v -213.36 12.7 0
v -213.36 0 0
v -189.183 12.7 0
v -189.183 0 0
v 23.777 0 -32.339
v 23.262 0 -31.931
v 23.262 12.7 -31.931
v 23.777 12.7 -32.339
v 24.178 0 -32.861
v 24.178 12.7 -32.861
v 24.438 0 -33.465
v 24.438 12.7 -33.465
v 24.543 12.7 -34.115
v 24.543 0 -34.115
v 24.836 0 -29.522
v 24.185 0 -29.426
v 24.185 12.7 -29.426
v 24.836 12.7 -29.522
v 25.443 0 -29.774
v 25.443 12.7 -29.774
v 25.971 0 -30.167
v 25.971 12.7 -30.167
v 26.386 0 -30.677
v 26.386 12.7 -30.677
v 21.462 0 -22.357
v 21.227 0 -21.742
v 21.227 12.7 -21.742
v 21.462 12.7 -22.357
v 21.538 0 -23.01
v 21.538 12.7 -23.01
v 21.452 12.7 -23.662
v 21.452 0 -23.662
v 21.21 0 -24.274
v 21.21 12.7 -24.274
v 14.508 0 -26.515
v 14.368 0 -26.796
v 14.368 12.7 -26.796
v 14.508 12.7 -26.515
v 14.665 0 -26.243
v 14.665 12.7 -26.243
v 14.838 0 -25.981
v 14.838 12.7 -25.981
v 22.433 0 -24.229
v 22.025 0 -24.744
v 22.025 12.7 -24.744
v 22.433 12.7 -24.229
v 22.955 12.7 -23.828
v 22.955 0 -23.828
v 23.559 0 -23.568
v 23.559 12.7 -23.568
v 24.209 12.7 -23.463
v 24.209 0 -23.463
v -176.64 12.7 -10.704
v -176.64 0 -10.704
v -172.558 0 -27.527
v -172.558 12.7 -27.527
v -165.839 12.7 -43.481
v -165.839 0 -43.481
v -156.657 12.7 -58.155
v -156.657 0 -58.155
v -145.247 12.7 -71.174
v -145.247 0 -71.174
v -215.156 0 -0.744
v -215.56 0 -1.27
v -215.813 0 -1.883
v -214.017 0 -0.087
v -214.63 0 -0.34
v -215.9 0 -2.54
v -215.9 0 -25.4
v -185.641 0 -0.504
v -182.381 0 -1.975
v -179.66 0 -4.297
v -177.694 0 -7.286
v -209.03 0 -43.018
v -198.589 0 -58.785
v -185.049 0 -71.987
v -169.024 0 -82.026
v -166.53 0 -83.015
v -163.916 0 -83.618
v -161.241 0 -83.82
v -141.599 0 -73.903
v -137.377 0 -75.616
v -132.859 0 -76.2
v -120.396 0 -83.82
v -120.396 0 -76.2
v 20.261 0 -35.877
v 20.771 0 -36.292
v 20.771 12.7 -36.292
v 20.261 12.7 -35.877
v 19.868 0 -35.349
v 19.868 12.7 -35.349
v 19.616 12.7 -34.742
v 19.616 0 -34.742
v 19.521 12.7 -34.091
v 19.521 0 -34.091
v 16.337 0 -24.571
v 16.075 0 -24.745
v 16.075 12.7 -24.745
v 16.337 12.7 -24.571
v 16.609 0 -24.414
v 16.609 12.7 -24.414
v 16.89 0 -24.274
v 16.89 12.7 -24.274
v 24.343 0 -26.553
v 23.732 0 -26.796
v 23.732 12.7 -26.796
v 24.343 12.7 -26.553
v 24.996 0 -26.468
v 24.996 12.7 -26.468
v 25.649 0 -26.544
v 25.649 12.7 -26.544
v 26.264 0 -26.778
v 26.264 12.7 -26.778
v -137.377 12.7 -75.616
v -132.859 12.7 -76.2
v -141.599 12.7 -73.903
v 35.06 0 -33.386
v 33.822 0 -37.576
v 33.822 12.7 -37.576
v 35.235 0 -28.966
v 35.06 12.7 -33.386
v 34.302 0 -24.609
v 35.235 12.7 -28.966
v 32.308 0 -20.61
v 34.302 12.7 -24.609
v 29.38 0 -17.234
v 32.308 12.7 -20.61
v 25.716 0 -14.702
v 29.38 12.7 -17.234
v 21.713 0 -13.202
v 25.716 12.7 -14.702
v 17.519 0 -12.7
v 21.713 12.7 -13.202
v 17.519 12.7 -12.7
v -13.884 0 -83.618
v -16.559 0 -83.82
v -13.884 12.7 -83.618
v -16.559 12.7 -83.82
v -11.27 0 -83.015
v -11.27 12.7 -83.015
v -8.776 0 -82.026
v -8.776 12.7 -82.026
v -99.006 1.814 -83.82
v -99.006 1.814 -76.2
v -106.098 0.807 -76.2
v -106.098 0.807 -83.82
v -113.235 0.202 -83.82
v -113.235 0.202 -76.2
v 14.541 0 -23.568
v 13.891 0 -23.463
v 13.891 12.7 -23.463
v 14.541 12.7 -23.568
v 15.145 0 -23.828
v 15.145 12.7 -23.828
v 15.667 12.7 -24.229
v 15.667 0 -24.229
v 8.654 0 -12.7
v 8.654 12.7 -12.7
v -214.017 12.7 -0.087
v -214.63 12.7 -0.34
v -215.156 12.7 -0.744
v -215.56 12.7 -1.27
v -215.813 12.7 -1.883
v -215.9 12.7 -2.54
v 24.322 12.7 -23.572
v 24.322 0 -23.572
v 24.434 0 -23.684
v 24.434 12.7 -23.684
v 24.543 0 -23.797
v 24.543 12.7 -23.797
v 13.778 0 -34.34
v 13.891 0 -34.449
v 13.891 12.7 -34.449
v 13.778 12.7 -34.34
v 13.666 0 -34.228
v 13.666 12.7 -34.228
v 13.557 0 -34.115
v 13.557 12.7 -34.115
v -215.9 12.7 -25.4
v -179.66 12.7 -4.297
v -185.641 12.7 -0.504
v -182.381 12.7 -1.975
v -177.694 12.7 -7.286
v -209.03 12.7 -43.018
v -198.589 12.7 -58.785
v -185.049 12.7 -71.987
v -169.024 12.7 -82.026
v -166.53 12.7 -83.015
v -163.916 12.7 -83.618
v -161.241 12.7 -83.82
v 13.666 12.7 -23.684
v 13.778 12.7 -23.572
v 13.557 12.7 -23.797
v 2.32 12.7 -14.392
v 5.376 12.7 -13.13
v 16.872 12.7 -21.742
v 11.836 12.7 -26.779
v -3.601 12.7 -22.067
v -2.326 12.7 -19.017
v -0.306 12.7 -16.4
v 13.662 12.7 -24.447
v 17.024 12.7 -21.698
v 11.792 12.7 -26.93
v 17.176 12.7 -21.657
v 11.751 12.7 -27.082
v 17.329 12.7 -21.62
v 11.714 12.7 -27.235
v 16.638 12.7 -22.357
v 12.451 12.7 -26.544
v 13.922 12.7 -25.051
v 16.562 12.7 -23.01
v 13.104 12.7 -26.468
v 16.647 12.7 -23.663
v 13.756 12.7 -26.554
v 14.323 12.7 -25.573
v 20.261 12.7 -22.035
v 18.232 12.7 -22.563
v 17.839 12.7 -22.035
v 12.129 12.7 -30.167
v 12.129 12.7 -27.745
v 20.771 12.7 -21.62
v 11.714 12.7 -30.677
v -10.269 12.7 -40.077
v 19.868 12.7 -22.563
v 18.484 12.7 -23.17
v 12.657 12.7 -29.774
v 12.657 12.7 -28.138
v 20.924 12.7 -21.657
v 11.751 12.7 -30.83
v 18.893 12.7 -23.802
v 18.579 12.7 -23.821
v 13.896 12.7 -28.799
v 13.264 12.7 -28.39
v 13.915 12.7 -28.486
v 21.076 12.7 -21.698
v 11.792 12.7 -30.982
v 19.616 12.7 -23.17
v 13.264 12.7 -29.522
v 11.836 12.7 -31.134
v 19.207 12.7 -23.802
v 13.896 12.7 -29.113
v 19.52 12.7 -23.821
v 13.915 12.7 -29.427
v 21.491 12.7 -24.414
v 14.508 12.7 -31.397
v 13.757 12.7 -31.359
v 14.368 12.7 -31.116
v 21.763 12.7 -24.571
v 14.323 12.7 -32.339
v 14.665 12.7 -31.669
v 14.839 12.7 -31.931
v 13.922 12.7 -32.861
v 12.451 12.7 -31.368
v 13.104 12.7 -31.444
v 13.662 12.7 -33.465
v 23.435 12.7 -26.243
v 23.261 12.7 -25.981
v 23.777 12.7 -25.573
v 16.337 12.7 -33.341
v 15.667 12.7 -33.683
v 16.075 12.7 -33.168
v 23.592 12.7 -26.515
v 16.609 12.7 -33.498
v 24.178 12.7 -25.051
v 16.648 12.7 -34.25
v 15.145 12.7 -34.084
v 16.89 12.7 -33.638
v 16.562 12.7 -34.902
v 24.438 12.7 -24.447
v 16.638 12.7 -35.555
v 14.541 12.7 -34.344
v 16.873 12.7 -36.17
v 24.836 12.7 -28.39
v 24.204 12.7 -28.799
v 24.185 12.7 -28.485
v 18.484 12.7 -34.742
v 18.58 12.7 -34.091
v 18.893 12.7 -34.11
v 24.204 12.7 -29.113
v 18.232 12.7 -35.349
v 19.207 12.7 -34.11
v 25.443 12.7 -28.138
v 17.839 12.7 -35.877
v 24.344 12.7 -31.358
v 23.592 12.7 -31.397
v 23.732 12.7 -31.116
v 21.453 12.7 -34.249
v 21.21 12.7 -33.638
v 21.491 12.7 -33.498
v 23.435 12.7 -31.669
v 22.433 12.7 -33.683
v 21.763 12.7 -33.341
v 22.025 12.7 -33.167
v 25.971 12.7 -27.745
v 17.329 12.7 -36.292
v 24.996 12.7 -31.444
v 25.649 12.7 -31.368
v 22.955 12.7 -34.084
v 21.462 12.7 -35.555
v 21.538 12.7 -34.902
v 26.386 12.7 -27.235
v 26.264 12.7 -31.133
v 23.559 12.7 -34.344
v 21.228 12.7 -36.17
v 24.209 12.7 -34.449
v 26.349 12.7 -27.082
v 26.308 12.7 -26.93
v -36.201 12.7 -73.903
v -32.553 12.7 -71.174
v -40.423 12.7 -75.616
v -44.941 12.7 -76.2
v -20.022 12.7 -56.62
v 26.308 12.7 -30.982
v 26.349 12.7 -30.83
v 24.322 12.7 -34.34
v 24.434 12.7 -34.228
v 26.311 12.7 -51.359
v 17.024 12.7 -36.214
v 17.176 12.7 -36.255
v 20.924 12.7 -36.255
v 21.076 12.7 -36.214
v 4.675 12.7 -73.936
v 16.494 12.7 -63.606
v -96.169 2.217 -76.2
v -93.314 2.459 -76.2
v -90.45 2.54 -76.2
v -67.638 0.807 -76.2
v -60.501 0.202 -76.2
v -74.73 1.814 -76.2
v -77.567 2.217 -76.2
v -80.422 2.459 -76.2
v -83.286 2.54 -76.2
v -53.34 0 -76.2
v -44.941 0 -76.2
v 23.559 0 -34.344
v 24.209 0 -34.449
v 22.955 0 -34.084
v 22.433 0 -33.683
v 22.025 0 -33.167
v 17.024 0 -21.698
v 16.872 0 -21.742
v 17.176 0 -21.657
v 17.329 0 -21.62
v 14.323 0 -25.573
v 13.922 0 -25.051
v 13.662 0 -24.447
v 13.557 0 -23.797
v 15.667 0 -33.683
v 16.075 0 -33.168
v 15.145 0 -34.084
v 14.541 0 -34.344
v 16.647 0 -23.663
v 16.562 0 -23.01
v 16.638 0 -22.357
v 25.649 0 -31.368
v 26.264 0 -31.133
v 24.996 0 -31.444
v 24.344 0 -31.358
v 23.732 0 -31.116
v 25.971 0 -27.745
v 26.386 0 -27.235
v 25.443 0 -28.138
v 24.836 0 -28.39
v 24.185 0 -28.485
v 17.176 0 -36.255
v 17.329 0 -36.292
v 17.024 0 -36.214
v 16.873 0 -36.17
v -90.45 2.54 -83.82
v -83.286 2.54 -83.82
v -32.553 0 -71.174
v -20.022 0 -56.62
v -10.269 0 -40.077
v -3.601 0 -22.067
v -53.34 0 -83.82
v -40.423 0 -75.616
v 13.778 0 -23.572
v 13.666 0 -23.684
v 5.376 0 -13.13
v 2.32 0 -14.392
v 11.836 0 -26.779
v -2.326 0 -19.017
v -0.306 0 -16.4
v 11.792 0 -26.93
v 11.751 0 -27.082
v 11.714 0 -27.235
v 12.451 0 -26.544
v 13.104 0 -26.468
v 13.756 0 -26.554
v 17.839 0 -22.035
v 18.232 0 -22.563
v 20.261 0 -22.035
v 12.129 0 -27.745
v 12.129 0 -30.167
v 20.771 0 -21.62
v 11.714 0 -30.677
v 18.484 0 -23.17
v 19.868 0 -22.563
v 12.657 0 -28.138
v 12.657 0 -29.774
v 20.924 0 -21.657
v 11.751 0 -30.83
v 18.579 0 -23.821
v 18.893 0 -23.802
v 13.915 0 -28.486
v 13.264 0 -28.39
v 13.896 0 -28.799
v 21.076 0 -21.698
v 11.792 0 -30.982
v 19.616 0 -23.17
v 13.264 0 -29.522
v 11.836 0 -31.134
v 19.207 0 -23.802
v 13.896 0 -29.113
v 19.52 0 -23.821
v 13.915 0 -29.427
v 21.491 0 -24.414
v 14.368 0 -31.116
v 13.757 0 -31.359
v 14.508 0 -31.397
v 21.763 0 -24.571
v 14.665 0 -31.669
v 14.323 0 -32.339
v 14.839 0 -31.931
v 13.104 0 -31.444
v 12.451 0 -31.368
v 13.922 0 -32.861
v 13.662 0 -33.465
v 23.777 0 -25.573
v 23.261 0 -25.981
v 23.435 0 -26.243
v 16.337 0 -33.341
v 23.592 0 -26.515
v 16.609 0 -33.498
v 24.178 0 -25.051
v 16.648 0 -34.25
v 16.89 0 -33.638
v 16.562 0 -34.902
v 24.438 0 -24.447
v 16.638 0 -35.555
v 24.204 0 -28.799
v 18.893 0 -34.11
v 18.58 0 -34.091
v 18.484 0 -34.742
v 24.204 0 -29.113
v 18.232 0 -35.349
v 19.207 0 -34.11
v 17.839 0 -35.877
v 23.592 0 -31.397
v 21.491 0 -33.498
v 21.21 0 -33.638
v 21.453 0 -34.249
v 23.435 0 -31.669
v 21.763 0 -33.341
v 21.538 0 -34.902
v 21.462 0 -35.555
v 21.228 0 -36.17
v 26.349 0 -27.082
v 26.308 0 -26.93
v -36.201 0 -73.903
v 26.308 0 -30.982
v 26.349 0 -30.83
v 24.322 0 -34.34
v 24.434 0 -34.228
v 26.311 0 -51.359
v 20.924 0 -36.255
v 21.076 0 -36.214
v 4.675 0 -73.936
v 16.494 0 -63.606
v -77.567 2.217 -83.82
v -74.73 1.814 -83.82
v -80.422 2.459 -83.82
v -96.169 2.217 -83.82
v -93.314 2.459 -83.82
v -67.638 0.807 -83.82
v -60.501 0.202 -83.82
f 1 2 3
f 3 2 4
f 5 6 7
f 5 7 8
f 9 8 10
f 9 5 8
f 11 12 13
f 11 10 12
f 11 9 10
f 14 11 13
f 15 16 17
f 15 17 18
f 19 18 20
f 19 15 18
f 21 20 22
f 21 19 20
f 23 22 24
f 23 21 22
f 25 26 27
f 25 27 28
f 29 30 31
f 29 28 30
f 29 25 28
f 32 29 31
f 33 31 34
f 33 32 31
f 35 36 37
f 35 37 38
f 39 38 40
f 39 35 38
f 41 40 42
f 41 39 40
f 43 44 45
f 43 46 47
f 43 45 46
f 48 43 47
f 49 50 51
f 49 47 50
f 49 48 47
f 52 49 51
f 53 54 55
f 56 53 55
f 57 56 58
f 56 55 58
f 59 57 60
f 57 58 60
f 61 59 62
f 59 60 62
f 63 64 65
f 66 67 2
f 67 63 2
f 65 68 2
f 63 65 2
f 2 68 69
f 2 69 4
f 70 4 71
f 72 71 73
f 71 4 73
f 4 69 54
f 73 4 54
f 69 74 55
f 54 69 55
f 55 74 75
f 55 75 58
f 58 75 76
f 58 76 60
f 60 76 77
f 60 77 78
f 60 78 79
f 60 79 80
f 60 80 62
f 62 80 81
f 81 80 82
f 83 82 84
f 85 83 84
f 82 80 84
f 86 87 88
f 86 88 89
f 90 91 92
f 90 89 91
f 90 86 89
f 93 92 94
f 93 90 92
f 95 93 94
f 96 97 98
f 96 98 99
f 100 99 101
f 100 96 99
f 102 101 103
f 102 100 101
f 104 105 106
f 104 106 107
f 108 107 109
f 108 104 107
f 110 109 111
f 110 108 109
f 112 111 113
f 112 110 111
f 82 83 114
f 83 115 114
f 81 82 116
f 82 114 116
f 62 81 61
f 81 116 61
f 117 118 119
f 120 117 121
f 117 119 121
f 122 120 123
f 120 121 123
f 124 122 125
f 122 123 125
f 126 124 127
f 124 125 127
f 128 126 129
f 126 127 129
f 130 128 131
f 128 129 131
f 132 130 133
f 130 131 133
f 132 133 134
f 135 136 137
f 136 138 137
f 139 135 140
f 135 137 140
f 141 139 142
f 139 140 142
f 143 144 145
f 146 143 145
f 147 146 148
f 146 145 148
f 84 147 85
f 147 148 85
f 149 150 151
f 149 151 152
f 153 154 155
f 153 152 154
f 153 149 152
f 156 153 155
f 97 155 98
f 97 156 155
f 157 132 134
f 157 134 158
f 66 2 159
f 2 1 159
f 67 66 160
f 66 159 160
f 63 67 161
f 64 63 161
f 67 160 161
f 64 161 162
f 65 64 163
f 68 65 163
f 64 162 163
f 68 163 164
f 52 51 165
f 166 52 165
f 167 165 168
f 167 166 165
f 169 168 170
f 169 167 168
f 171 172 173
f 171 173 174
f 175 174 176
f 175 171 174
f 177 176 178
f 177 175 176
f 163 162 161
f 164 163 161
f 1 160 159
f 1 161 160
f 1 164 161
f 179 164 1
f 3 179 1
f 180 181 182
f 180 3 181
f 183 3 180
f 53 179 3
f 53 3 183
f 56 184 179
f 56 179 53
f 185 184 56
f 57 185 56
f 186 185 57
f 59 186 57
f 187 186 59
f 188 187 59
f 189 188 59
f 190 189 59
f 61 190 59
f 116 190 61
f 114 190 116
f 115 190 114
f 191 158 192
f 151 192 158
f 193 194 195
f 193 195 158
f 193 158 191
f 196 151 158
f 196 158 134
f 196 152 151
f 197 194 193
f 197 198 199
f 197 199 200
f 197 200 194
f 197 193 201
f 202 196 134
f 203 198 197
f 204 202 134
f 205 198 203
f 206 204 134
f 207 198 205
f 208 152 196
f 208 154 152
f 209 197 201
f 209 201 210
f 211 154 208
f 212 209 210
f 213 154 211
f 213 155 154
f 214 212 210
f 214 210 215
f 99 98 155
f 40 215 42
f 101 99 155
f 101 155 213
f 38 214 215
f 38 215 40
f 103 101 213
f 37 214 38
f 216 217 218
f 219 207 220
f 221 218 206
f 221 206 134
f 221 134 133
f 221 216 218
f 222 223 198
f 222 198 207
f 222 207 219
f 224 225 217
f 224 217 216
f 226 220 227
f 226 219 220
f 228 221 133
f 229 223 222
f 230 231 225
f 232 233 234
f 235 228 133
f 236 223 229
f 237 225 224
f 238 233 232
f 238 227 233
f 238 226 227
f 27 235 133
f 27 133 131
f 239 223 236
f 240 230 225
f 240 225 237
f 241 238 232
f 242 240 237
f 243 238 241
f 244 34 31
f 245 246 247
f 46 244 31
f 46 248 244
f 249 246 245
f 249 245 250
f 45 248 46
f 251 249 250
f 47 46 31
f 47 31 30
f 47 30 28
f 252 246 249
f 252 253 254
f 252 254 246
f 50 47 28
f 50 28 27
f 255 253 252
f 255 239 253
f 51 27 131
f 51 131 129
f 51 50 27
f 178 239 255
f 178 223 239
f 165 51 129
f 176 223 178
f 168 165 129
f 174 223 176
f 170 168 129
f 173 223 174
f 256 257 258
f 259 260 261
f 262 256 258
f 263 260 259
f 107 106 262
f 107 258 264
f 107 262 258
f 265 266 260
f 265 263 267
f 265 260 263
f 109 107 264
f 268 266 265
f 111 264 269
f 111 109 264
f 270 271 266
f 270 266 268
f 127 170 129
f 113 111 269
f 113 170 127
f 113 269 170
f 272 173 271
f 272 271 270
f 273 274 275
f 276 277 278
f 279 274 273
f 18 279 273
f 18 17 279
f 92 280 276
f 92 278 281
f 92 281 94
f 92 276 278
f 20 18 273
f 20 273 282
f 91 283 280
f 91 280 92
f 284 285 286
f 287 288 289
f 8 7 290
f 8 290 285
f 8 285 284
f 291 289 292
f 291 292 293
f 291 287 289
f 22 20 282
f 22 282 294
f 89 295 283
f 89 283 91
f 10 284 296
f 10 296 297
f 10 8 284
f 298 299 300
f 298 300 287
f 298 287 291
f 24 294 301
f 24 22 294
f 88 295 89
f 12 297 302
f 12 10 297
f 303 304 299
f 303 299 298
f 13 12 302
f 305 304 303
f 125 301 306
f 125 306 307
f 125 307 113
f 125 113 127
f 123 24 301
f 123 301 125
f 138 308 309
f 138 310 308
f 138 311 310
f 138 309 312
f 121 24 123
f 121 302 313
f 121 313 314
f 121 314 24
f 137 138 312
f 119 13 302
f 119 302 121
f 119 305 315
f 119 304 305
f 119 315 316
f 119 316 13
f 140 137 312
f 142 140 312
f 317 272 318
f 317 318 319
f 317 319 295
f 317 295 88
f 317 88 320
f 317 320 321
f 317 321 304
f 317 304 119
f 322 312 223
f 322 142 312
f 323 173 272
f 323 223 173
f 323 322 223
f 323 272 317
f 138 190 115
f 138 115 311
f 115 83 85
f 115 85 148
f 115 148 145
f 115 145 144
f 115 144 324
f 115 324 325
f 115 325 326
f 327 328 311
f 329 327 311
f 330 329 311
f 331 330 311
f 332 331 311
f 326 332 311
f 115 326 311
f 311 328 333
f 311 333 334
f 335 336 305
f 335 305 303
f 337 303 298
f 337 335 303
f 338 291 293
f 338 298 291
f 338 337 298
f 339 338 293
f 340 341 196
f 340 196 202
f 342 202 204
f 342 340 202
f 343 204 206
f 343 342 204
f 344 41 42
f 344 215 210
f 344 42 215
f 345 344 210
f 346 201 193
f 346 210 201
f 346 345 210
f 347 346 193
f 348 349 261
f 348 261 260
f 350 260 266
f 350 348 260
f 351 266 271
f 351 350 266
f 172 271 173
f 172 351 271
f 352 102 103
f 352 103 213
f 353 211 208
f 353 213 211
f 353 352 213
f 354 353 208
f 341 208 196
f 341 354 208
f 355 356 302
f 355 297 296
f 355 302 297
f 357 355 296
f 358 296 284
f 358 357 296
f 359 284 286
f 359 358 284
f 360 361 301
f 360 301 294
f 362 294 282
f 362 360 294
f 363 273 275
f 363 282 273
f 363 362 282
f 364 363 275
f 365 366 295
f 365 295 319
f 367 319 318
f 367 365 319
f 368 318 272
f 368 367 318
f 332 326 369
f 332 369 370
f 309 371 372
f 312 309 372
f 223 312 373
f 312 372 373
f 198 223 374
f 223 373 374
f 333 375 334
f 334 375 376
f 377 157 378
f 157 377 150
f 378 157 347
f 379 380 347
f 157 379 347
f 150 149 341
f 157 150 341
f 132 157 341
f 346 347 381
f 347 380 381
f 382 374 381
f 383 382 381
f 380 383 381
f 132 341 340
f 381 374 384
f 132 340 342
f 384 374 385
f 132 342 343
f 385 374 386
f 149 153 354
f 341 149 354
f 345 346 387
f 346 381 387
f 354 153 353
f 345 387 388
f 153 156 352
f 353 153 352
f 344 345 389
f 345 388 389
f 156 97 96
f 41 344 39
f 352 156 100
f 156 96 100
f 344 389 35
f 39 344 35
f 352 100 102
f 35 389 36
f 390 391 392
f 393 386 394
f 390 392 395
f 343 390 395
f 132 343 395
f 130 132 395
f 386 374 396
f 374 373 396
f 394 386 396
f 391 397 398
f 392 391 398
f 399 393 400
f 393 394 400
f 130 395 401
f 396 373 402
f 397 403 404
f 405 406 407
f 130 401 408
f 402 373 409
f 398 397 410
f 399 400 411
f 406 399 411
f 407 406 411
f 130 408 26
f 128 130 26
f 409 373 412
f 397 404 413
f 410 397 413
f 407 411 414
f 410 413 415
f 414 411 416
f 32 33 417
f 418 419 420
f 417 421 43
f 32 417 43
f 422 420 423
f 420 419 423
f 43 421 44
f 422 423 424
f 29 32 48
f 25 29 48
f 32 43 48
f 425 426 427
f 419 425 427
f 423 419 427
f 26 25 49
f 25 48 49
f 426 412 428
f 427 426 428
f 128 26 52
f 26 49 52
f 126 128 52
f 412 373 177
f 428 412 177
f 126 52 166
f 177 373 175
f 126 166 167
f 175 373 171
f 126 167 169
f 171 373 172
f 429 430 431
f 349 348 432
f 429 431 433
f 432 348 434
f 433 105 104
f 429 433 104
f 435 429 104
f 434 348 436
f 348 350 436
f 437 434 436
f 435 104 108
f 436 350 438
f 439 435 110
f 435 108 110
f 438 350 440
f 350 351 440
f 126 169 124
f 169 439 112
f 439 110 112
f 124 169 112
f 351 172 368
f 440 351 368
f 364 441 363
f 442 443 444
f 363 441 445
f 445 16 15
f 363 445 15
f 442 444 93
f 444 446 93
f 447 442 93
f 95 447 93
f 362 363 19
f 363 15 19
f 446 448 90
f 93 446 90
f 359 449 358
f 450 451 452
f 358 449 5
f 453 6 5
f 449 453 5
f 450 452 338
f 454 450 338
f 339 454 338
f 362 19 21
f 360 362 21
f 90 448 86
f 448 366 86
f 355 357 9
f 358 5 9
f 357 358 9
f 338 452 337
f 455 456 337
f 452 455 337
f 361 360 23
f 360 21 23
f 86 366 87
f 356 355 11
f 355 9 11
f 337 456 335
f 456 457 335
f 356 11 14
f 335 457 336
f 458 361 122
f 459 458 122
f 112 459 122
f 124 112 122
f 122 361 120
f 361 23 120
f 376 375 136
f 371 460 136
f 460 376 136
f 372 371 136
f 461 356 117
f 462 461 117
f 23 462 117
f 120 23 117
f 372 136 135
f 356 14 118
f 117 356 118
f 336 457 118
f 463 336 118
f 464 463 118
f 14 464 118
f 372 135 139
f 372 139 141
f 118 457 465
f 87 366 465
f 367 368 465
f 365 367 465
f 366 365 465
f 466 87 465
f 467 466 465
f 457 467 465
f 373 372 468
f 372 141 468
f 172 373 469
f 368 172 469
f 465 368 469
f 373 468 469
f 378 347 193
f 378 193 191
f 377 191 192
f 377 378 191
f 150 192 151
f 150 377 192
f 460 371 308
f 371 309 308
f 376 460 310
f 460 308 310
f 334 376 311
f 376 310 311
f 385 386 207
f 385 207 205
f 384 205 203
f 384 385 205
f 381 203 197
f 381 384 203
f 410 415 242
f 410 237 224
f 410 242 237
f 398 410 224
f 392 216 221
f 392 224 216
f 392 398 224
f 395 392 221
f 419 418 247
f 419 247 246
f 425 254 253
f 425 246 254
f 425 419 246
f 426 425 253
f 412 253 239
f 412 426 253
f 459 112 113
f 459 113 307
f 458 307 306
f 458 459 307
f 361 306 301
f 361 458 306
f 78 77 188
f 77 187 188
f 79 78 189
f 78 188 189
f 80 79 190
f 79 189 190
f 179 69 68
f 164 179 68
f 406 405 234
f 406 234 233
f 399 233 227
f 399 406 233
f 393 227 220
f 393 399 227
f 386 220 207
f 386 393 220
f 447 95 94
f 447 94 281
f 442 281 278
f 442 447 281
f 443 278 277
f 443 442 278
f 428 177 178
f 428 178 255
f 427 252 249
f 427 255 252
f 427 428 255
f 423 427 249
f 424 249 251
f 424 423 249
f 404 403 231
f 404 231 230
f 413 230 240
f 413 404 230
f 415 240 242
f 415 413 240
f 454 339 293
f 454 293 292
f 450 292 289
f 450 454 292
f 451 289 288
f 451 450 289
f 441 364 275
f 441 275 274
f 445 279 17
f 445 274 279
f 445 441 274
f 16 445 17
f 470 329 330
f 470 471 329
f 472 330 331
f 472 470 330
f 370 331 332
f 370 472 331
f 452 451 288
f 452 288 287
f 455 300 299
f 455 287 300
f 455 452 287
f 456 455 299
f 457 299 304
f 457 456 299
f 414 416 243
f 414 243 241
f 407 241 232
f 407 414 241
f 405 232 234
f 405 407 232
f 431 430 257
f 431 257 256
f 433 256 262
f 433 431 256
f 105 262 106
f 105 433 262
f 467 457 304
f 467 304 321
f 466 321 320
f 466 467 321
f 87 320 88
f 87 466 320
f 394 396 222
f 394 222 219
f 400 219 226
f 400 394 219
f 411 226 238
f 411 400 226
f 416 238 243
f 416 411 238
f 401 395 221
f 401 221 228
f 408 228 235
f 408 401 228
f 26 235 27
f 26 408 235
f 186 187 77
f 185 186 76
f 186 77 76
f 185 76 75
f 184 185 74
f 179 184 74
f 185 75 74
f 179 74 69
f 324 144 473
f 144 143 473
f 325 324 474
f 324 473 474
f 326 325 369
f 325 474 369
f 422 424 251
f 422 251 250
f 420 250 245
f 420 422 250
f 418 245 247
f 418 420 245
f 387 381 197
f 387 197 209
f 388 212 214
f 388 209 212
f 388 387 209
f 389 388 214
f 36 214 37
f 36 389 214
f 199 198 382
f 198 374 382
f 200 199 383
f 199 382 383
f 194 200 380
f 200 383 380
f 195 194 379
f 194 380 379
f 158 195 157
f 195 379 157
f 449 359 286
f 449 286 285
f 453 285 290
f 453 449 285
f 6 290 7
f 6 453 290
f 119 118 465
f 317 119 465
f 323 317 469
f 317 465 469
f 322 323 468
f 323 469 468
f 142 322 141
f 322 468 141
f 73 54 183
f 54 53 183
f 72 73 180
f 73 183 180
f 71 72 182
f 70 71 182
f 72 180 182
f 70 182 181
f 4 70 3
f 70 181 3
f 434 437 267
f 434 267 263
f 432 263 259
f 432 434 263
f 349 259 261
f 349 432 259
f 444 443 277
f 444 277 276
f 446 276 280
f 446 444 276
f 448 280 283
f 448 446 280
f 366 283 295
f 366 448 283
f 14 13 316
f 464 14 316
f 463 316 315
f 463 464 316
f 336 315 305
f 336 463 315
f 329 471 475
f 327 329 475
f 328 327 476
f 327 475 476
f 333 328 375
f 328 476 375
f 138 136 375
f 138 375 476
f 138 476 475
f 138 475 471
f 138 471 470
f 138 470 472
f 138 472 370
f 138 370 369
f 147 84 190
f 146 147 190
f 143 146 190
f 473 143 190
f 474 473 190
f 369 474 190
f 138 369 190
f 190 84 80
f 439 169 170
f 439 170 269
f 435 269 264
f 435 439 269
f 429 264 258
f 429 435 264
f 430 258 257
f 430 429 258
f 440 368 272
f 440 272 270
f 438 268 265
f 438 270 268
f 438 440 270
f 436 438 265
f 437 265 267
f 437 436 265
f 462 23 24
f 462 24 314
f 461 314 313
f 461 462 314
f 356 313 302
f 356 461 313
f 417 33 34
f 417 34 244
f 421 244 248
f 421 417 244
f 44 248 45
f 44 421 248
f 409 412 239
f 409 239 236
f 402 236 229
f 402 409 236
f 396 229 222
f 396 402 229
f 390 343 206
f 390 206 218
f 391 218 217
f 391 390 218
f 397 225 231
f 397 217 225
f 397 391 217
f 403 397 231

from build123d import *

# Parameters (mm, degrees)
BOSS_EXTRUDE1_DEPTH = 12.7
SKETCH3_R           = 2.286
CUT_EXTRUDE1_DEPTH  = 232.948038146
CAVITY1_START       = -1
CAVITY1_OUTLINE_R   = 2.286
CAVITY1_DEPTH       = 15
CUT_EXTRUDE2_DEPTH  = 232.948038146
FILLET1_R           = 12.7
FILLET2_R           = 2.54
FILLET3_R           = 20.32
FILLET4_R           = 17.78
SKETCH5_W           = 16.51
SKETCH5_H           = 5.08
CUT_EXTRUDE3_DEPTH  = 230.304470216
FILLET5_R           = 127
FILLET6_R           = 50.8


with BuildPart() as part:
    # Sketch1 → Boss-Extrude1 (new body)
    with BuildSketch(Plane(origin=(0, 0, 0), x_dir=(1, 0, 0), z_dir=(0, 1, 0))):
        with BuildLine():
            Line((0, 0), (38.1, 0))
            Line((38.1, 0), (38.1, 25.4))
            ThreePointArc((38.1, 25.4), (19.393233119, 60.430202712), (-12.7, 83.82))
            Line((-12.7, 83.82), (-165.1, 83.82))
            ThreePointArc((-165.1, 83.82), (-197.193233119, 60.430202712), (-215.9, 25.4))
            Line((-215.9, 25.4), (-215.9, 0))
            Line((-215.9, 0), (-177.8, 0))
            ThreePointArc((-177.8, 0), (-166.58502935, 42.017514675), (-139.7, 76.2))
            Line((-139.7, 76.2), (-38.1, 76.2))
            ThreePointArc((-38.1, 76.2), (-11.21497065, 42.017514675), (0, 0))
        make_face()
    extrude(amount=BOSS_EXTRUDE1_DEPTH)

    # Sketch3 → Cut-Extrude1 (cut, through all)
    with BuildSketch(Plane(origin=(0, 12.7, 0), x_dir=(1, 0, 0), z_dir=(0, 1, 0))):
        with Locations(Location((19.05, 28.956, 0), (0, 0, 270))):
            Circle(SKETCH3_R)
    extrude(amount=-CUT_EXTRUDE1_DEPTH, mode=Mode.SUBTRACT)

    # Cavity1: read off the stored shape, not the designer's step
    # Cavity1 outline → Cavity1 (cut)
    with BuildSketch(Plane(origin=(0, 0, 0), x_dir=(1, 0, 0), z_dir=(0, 1, 0)).offset(CAVITY1_START)):
        with BuildLine():
            ThreePointArc((13.557199982, 23.797473427), (13.721594677, 23.627834729), (13.891225968, 23.463432392))
            ThreePointArc((13.891225968, 23.463432392), (15.144839416, 23.828362371), (16.075009031, 24.744607454))
            ThreePointArc((16.075009031, 24.744607454), (16.471799412, 24.490657889), (16.890111616, 24.273983275))
            ThreePointArc((16.890111616, 24.273983275), (16.561647975, 23.010325013), (16.872358933, 21.742184932))
            ThreePointArc((16.872358933, 21.742184932), (17.099548264, 21.677470858), (17.32865444, 21.619909903))
            ThreePointArc((17.32865444, 21.619909903), (18.231850543, 22.56275526), (18.579278518, 23.821331586))
            ThreePointArc((18.579278518, 23.821331586), (19.049883851, 23.799800001), (19.520490153, 23.821310384))
            ThreePointArc((19.520490153, 23.821310384), (19.867861426, 22.562718407), (20.77101505, 21.61983236))
            ThreePointArc((20.77101505, 21.61983236), (21.000123819, 21.677382993), (21.227316065, 21.742086832))
            ThreePointArc((21.227316065, 21.742086832), (21.538084156, 23.010212914), (21.209677446, 24.273885972))
            ThreePointArc((21.209677446, 24.273885972), (21.627999411, 24.490541739), (22.024801233, 24.744473428))
            ThreePointArc((22.024801233, 24.744473428), (22.954929568, 23.828186439), (24.208526573, 23.463199982))
            ThreePointArc((24.208526573, 23.463199982), (24.378165271, 23.627594677), (24.542567608, 23.797225968))
            ThreePointArc((24.542567608, 23.797225968), (24.177637629, 25.050839416), (23.261392546, 25.981009031))
            ThreePointArc((23.261392546, 25.981009031), (23.515342111, 26.377799412), (23.732016725, 26.796111616))
            ThreePointArc((23.732016725, 26.796111616), (24.995674987, 26.467647975), (26.263815068, 26.778358933))
            ThreePointArc((26.263815068, 26.778358933), (26.328529142, 27.005548264), (26.386090097, 27.23465444))
            ThreePointArc((26.386090097, 27.23465444), (25.44324474, 28.137850543), (24.184668414, 28.485278518))
            ThreePointArc((24.184668414, 28.485278518), (24.206199999, 28.955883851), (24.184689616, 29.426490153))
            ThreePointArc((24.184689616, 29.426490153), (25.443281593, 29.773861426), (26.38616764, 30.67701505))
            ThreePointArc((26.38616764, 30.67701505), (26.328617007, 30.906123819), (26.263913168, 31.133316065))
            ThreePointArc((26.263913168, 31.133316065), (24.995787086, 31.444084156), (23.732114028, 31.115677446))
            ThreePointArc((23.732114028, 31.115677446), (23.515458261, 31.533999411), (23.261526572, 31.930801233))
            ThreePointArc((23.261526572, 31.930801233), (24.177813561, 32.860929568), (24.542800018, 34.114526573))
            ThreePointArc((24.542800018, 34.114526573), (24.378405323, 34.284165271), (24.208774032, 34.448567608))
            ThreePointArc((24.208774032, 34.448567608), (22.955160584, 34.083637629), (22.024990969, 33.167392546))
            ThreePointArc((22.024990969, 33.167392546), (21.628200588, 33.421342111), (21.209888384, 33.638016725))
            ThreePointArc((21.209888384, 33.638016725), (21.538352025, 34.901674987), (21.227641067, 36.169815068))
            ThreePointArc((21.227641067, 36.169815068), (21.000451736, 36.234529142), (20.77134556, 36.292090097))
            ThreePointArc((20.77134556, 36.292090097), (19.868149457, 35.34924474), (19.520721482, 34.090668414))
            ThreePointArc((19.520721482, 34.090668414), (19.050116149, 34.112199999), (18.579509847, 34.090689616))
            ThreePointArc((18.579509847, 34.090689616), (18.232138574, 35.349281593), (17.32898495, 36.29216764))
            ThreePointArc((17.32898495, 36.29216764), (17.099876181, 36.234617007), (16.872683935, 36.169913168))
            ThreePointArc((16.872683935, 36.169913168), (16.561915844, 34.901787086), (16.890322554, 33.638114028))
            ThreePointArc((16.890322554, 33.638114028), (16.472000589, 33.421458261), (16.075198767, 33.167526572))
            ThreePointArc((16.075198767, 33.167526572), (15.145070432, 34.083813561), (13.891473427, 34.448800018))
            ThreePointArc((13.891473427, 34.448800018), (13.721834729, 34.284405323), (13.557432392, 34.114774032))
            ThreePointArc((13.557432392, 34.114774032), (13.922362371, 32.861160584), (14.838607454, 31.930990969))
            ThreePointArc((14.838607454, 31.930990969), (14.584657889, 31.534200588), (14.367983275, 31.115888384))
            ThreePointArc((14.367983275, 31.115888384), (13.104325013, 31.444352025), (11.836184932, 31.133641067))
            ThreePointArc((11.836184932, 31.133641067), (11.771470858, 30.906451736), (11.713909903, 30.67734556))
            ThreePointArc((11.713909903, 30.67734556), (12.65675526, 29.774149457), (13.915331586, 29.426721482))
            ThreePointArc((13.915331586, 29.426721482), (13.893800001, 28.956116149), (13.915310384, 28.485509847))
            ThreePointArc((13.915310384, 28.485509847), (12.656718407, 28.138138574), (11.71383236, 27.23498495))
            ThreePointArc((11.71383236, 27.23498495), (11.771382993, 27.005876181), (11.836086832, 26.778683935))
            ThreePointArc((11.836086832, 26.778683935), (13.104212914, 26.467915844), (14.367885972, 26.796322554))
            ThreePointArc((14.367885972, 26.796322554), (14.584541739, 26.378000589), (14.838473428, 25.981198767))
            ThreePointArc((14.838473428, 25.981198767), (13.922186439, 25.051070432), (13.557199982, 23.797473427))
        make_face()
        with Locations((19.05, 28.956)):
            Circle(CAVITY1_OUTLINE_R, mode=Mode.SUBTRACT)
    extrude(amount=CAVITY1_DEPTH, mode=Mode.SUBTRACT)

    # Sketch4 → Cut-Extrude2 (cut, through all)
    with BuildSketch(Plane(origin=(0, 12.7, 0), x_dir=(1, 0, 0), z_dir=(0, 1, 0))):
        with BuildLine():
            Line((38.1, 12.7), (-1.496322316, 12.7))
            ThreePointArc((-1.496322316, 12.7), (-0.559939387, 6.372176412), (0, 0))
            Line((0, 0), (38.1, 0))
            Line((38.1, 0), (38.1, 12.7))
        make_face()
    extrude(amount=-CUT_EXTRUDE2_DEPTH, mode=Mode.SUBTRACT)

    # Fillet1
    fillet1_edges = [part.edges().sort_by_distance(p)[0] for p in [
        (-1.496322316, 6.35, -12.7),
        (-177.8, 6.35, 0),
    ]]
    fillet(fillet1_edges, radius=FILLET1_R)

    # Fillet2
    fillet2_edges = [part.edges().sort_by_distance(p)[0] for p in [
        (-215.9, 6.35, 0),
    ]]
    fillet(fillet2_edges, radius=FILLET2_R)

    # Fillet3
    # the kernel refuses this fillet: 20.32 mm, written as the material it takes off along each edge
    with BuildSketch(Plane(origin=(38.1, 59.792860393, -12.7), x_dir=(0, 0, -1), z_dir=(0, -1, 0))) as fillet3_piece_1:
        with BuildLine():
            CenterArc((20.32, -18.837144157), FILLET3_R, 112.024312837, 67.975687163)
            Line((0, -18.837144157), (-0.4064, -18.837144157))
            Line((-0.4064, -18.837144157), (-0.4064, 0))
            Line((-0.4064, 0), (0, 0.4064))
            ThreePointArc((0, 0.4064), (6.35, 0.4064), (12.5476, 0.376742883))
            Line((12.5476, 0.376742883), (12.7, 0))
        make_face()
    extrude(amount=106.885720786, mode=Mode.SUBTRACT)

    # Fillet4
    fillet4_edges = [part.edges().sort_by_distance(p)[0] for p in [
        (38.1, 6.35, -25.4),
        (-139.7, 6.35, -76.2),
        (-38.1, 6.35, -76.2),
        (-12.7, 6.35, -83.82),
        (-165.1, 6.35, -83.82),
    ]]
    fillet(fillet4_edges, radius=FILLET4_R)

    # Sketch5 → Cut-Extrude3 (cut, through all)
    with BuildSketch(Plane.XY.offset(-76.2)):
        with Locations((-86.868, 0)):
            Rectangle(SKETCH5_W, SKETCH5_H)
    extrude(amount=-CUT_EXTRUDE3_DEPTH, mode=Mode.SUBTRACT)

    # Fillet5
    # the kernel refuses this fillet: 127 mm, written as the material it takes off along each edge
    with BuildSketch(Plane(origin=(-95.123, 0, -13.018297744), x_dir=(-1, 0, 0), z_dir=(0, 0, -1)), Plane(origin=(-78.613, 0, -147.001702256), x_dir=(1, 0, 0), z_dir=(0, 0, 1))) as fillet5_piece_1:
        with BuildLine():
            CenterArc((25.272680903, 127), FILLET5_R, 258.521659045, 11.478340955)
            Line((0, 2.54), (0, 0))
            Line((0, 0), (25.272680903, 0))
        make_face()
    extrude(amount=133.983404513, mode=Mode.SUBTRACT)

    # Fillet6
    fillet6_edges = [part.edges().sort_by_distance(p)[0] for p in [
        (-78.613, 2.54, -80.01),
        (-95.123, 2.54, -80.01),
    ]]
    fillet(fillet6_edges, radius=FILLET6_R)


solid = part.part
